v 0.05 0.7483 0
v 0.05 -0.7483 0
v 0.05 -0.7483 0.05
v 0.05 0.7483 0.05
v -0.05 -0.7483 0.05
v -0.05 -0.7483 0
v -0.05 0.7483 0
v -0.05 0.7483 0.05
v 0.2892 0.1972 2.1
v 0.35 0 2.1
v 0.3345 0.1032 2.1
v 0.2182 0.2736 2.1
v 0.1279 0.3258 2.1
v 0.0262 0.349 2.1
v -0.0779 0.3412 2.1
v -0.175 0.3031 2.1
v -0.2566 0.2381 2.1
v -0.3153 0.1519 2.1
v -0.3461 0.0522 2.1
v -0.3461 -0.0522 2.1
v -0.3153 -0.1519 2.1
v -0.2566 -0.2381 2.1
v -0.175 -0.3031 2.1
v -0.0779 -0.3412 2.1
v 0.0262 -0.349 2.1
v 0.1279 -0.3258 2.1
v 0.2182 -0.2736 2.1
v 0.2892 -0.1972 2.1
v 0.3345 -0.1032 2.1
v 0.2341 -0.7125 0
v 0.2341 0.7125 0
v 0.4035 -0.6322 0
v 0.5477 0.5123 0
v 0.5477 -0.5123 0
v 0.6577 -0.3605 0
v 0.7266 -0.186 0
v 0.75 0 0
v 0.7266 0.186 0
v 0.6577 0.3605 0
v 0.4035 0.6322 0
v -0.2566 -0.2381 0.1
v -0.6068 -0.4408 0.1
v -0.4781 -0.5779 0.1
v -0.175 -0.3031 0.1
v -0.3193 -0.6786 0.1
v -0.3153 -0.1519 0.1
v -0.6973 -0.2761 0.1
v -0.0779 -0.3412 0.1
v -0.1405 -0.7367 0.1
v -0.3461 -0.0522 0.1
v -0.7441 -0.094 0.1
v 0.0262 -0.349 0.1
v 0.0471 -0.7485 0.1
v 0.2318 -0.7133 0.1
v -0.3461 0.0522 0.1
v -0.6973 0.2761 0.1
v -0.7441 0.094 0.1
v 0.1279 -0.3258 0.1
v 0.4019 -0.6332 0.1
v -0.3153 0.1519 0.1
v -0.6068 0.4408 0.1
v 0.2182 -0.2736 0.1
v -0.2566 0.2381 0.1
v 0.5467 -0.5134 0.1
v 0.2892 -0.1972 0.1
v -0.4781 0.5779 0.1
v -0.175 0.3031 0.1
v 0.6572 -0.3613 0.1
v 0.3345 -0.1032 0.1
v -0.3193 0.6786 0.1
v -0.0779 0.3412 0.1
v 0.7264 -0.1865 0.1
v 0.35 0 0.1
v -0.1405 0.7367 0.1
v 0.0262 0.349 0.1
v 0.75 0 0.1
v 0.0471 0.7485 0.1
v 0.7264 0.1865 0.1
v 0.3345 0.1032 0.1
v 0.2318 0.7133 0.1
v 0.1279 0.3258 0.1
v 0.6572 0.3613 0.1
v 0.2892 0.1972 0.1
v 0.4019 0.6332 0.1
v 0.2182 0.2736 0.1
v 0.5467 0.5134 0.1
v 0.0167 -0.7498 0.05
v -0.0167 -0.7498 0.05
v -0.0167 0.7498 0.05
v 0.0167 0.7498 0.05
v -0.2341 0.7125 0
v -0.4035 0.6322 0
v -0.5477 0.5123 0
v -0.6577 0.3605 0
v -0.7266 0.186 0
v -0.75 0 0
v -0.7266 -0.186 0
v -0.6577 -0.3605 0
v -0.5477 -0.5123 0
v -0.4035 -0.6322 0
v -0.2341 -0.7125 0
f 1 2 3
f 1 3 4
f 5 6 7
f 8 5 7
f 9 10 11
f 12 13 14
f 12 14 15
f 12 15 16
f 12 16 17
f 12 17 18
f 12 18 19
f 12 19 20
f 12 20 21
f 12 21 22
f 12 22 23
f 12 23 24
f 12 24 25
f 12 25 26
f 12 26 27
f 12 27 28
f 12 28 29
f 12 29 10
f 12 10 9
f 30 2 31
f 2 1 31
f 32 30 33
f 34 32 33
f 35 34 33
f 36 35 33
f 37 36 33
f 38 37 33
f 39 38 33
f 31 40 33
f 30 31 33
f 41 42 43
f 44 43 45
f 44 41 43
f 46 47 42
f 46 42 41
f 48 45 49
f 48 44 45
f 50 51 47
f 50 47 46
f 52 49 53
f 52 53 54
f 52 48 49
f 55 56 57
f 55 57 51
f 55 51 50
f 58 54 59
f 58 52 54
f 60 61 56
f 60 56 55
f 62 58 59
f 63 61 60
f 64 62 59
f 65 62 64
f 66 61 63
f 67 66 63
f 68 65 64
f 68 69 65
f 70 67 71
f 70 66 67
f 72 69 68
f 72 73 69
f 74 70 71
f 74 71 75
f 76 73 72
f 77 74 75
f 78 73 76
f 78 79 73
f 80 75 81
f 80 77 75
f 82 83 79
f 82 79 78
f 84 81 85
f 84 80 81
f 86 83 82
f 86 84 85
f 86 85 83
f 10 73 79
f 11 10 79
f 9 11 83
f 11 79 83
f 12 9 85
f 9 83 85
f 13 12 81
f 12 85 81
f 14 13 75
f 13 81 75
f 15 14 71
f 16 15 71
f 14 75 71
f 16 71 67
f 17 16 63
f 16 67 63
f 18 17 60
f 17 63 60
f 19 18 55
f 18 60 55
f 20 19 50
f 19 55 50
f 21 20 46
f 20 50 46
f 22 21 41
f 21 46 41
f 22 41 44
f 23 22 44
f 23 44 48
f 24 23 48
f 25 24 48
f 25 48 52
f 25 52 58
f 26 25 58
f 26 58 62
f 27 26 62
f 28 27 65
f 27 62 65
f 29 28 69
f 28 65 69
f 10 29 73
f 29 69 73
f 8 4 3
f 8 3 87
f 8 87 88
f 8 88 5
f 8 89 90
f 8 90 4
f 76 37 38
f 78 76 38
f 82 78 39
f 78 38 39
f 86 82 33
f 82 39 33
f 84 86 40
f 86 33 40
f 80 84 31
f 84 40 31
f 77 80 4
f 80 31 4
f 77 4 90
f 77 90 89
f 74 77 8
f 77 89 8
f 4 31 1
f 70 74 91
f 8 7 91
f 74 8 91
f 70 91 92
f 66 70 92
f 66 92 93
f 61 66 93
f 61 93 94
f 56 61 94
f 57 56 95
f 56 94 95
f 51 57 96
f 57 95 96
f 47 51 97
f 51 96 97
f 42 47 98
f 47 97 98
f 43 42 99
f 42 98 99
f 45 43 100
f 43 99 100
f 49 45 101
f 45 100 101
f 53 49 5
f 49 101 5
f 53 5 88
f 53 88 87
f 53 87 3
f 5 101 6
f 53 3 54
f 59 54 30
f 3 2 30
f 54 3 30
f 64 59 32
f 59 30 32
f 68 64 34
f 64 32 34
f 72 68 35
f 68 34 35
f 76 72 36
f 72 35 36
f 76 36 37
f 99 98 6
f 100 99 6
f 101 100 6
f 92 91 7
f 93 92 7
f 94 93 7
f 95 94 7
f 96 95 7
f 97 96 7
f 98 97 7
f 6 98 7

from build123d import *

# Parameters (mm, degrees)
CROQUIS1_R              = 0.75
SALIENTE_EXTRUIR1_DEPTH = 0.1
CROQUIS2_R              = 0.35
SALIENTE_EXTRUIR2_DEPTH = 2
CROQUIS3_W              = 0.1
CROQUIS3_H              = 1.62143155
CORTAR_EXTRUIR1_DEPTH   = 0.05


with BuildPart() as part:
    # Croquis1 → Saliente-Extruir1 (new body)
    with BuildSketch(Plane.XY):
        Circle(CROQUIS1_R)
    extrude(amount=SALIENTE_EXTRUIR1_DEPTH)

    # Croquis2 → Saliente-Extruir2 (add)
    with BuildSketch(Plane.XY.offset(0.1)):
        Circle(CROQUIS2_R)
    extrude(amount=SALIENTE_EXTRUIR2_DEPTH)

    # Croquis3 → Cortar-Extruir1 (cut)
    with BuildSketch(Plane(origin=(0, 0, 0), x_dir=(-1, 0, 0), z_dir=(0, 0, -1))):
        Rectangle(CROQUIS3_W, CROQUIS3_H)
    extrude(amount=-CORTAR_EXTRUIR1_DEPTH, mode=Mode.SUBTRACT)


solid = part.part
